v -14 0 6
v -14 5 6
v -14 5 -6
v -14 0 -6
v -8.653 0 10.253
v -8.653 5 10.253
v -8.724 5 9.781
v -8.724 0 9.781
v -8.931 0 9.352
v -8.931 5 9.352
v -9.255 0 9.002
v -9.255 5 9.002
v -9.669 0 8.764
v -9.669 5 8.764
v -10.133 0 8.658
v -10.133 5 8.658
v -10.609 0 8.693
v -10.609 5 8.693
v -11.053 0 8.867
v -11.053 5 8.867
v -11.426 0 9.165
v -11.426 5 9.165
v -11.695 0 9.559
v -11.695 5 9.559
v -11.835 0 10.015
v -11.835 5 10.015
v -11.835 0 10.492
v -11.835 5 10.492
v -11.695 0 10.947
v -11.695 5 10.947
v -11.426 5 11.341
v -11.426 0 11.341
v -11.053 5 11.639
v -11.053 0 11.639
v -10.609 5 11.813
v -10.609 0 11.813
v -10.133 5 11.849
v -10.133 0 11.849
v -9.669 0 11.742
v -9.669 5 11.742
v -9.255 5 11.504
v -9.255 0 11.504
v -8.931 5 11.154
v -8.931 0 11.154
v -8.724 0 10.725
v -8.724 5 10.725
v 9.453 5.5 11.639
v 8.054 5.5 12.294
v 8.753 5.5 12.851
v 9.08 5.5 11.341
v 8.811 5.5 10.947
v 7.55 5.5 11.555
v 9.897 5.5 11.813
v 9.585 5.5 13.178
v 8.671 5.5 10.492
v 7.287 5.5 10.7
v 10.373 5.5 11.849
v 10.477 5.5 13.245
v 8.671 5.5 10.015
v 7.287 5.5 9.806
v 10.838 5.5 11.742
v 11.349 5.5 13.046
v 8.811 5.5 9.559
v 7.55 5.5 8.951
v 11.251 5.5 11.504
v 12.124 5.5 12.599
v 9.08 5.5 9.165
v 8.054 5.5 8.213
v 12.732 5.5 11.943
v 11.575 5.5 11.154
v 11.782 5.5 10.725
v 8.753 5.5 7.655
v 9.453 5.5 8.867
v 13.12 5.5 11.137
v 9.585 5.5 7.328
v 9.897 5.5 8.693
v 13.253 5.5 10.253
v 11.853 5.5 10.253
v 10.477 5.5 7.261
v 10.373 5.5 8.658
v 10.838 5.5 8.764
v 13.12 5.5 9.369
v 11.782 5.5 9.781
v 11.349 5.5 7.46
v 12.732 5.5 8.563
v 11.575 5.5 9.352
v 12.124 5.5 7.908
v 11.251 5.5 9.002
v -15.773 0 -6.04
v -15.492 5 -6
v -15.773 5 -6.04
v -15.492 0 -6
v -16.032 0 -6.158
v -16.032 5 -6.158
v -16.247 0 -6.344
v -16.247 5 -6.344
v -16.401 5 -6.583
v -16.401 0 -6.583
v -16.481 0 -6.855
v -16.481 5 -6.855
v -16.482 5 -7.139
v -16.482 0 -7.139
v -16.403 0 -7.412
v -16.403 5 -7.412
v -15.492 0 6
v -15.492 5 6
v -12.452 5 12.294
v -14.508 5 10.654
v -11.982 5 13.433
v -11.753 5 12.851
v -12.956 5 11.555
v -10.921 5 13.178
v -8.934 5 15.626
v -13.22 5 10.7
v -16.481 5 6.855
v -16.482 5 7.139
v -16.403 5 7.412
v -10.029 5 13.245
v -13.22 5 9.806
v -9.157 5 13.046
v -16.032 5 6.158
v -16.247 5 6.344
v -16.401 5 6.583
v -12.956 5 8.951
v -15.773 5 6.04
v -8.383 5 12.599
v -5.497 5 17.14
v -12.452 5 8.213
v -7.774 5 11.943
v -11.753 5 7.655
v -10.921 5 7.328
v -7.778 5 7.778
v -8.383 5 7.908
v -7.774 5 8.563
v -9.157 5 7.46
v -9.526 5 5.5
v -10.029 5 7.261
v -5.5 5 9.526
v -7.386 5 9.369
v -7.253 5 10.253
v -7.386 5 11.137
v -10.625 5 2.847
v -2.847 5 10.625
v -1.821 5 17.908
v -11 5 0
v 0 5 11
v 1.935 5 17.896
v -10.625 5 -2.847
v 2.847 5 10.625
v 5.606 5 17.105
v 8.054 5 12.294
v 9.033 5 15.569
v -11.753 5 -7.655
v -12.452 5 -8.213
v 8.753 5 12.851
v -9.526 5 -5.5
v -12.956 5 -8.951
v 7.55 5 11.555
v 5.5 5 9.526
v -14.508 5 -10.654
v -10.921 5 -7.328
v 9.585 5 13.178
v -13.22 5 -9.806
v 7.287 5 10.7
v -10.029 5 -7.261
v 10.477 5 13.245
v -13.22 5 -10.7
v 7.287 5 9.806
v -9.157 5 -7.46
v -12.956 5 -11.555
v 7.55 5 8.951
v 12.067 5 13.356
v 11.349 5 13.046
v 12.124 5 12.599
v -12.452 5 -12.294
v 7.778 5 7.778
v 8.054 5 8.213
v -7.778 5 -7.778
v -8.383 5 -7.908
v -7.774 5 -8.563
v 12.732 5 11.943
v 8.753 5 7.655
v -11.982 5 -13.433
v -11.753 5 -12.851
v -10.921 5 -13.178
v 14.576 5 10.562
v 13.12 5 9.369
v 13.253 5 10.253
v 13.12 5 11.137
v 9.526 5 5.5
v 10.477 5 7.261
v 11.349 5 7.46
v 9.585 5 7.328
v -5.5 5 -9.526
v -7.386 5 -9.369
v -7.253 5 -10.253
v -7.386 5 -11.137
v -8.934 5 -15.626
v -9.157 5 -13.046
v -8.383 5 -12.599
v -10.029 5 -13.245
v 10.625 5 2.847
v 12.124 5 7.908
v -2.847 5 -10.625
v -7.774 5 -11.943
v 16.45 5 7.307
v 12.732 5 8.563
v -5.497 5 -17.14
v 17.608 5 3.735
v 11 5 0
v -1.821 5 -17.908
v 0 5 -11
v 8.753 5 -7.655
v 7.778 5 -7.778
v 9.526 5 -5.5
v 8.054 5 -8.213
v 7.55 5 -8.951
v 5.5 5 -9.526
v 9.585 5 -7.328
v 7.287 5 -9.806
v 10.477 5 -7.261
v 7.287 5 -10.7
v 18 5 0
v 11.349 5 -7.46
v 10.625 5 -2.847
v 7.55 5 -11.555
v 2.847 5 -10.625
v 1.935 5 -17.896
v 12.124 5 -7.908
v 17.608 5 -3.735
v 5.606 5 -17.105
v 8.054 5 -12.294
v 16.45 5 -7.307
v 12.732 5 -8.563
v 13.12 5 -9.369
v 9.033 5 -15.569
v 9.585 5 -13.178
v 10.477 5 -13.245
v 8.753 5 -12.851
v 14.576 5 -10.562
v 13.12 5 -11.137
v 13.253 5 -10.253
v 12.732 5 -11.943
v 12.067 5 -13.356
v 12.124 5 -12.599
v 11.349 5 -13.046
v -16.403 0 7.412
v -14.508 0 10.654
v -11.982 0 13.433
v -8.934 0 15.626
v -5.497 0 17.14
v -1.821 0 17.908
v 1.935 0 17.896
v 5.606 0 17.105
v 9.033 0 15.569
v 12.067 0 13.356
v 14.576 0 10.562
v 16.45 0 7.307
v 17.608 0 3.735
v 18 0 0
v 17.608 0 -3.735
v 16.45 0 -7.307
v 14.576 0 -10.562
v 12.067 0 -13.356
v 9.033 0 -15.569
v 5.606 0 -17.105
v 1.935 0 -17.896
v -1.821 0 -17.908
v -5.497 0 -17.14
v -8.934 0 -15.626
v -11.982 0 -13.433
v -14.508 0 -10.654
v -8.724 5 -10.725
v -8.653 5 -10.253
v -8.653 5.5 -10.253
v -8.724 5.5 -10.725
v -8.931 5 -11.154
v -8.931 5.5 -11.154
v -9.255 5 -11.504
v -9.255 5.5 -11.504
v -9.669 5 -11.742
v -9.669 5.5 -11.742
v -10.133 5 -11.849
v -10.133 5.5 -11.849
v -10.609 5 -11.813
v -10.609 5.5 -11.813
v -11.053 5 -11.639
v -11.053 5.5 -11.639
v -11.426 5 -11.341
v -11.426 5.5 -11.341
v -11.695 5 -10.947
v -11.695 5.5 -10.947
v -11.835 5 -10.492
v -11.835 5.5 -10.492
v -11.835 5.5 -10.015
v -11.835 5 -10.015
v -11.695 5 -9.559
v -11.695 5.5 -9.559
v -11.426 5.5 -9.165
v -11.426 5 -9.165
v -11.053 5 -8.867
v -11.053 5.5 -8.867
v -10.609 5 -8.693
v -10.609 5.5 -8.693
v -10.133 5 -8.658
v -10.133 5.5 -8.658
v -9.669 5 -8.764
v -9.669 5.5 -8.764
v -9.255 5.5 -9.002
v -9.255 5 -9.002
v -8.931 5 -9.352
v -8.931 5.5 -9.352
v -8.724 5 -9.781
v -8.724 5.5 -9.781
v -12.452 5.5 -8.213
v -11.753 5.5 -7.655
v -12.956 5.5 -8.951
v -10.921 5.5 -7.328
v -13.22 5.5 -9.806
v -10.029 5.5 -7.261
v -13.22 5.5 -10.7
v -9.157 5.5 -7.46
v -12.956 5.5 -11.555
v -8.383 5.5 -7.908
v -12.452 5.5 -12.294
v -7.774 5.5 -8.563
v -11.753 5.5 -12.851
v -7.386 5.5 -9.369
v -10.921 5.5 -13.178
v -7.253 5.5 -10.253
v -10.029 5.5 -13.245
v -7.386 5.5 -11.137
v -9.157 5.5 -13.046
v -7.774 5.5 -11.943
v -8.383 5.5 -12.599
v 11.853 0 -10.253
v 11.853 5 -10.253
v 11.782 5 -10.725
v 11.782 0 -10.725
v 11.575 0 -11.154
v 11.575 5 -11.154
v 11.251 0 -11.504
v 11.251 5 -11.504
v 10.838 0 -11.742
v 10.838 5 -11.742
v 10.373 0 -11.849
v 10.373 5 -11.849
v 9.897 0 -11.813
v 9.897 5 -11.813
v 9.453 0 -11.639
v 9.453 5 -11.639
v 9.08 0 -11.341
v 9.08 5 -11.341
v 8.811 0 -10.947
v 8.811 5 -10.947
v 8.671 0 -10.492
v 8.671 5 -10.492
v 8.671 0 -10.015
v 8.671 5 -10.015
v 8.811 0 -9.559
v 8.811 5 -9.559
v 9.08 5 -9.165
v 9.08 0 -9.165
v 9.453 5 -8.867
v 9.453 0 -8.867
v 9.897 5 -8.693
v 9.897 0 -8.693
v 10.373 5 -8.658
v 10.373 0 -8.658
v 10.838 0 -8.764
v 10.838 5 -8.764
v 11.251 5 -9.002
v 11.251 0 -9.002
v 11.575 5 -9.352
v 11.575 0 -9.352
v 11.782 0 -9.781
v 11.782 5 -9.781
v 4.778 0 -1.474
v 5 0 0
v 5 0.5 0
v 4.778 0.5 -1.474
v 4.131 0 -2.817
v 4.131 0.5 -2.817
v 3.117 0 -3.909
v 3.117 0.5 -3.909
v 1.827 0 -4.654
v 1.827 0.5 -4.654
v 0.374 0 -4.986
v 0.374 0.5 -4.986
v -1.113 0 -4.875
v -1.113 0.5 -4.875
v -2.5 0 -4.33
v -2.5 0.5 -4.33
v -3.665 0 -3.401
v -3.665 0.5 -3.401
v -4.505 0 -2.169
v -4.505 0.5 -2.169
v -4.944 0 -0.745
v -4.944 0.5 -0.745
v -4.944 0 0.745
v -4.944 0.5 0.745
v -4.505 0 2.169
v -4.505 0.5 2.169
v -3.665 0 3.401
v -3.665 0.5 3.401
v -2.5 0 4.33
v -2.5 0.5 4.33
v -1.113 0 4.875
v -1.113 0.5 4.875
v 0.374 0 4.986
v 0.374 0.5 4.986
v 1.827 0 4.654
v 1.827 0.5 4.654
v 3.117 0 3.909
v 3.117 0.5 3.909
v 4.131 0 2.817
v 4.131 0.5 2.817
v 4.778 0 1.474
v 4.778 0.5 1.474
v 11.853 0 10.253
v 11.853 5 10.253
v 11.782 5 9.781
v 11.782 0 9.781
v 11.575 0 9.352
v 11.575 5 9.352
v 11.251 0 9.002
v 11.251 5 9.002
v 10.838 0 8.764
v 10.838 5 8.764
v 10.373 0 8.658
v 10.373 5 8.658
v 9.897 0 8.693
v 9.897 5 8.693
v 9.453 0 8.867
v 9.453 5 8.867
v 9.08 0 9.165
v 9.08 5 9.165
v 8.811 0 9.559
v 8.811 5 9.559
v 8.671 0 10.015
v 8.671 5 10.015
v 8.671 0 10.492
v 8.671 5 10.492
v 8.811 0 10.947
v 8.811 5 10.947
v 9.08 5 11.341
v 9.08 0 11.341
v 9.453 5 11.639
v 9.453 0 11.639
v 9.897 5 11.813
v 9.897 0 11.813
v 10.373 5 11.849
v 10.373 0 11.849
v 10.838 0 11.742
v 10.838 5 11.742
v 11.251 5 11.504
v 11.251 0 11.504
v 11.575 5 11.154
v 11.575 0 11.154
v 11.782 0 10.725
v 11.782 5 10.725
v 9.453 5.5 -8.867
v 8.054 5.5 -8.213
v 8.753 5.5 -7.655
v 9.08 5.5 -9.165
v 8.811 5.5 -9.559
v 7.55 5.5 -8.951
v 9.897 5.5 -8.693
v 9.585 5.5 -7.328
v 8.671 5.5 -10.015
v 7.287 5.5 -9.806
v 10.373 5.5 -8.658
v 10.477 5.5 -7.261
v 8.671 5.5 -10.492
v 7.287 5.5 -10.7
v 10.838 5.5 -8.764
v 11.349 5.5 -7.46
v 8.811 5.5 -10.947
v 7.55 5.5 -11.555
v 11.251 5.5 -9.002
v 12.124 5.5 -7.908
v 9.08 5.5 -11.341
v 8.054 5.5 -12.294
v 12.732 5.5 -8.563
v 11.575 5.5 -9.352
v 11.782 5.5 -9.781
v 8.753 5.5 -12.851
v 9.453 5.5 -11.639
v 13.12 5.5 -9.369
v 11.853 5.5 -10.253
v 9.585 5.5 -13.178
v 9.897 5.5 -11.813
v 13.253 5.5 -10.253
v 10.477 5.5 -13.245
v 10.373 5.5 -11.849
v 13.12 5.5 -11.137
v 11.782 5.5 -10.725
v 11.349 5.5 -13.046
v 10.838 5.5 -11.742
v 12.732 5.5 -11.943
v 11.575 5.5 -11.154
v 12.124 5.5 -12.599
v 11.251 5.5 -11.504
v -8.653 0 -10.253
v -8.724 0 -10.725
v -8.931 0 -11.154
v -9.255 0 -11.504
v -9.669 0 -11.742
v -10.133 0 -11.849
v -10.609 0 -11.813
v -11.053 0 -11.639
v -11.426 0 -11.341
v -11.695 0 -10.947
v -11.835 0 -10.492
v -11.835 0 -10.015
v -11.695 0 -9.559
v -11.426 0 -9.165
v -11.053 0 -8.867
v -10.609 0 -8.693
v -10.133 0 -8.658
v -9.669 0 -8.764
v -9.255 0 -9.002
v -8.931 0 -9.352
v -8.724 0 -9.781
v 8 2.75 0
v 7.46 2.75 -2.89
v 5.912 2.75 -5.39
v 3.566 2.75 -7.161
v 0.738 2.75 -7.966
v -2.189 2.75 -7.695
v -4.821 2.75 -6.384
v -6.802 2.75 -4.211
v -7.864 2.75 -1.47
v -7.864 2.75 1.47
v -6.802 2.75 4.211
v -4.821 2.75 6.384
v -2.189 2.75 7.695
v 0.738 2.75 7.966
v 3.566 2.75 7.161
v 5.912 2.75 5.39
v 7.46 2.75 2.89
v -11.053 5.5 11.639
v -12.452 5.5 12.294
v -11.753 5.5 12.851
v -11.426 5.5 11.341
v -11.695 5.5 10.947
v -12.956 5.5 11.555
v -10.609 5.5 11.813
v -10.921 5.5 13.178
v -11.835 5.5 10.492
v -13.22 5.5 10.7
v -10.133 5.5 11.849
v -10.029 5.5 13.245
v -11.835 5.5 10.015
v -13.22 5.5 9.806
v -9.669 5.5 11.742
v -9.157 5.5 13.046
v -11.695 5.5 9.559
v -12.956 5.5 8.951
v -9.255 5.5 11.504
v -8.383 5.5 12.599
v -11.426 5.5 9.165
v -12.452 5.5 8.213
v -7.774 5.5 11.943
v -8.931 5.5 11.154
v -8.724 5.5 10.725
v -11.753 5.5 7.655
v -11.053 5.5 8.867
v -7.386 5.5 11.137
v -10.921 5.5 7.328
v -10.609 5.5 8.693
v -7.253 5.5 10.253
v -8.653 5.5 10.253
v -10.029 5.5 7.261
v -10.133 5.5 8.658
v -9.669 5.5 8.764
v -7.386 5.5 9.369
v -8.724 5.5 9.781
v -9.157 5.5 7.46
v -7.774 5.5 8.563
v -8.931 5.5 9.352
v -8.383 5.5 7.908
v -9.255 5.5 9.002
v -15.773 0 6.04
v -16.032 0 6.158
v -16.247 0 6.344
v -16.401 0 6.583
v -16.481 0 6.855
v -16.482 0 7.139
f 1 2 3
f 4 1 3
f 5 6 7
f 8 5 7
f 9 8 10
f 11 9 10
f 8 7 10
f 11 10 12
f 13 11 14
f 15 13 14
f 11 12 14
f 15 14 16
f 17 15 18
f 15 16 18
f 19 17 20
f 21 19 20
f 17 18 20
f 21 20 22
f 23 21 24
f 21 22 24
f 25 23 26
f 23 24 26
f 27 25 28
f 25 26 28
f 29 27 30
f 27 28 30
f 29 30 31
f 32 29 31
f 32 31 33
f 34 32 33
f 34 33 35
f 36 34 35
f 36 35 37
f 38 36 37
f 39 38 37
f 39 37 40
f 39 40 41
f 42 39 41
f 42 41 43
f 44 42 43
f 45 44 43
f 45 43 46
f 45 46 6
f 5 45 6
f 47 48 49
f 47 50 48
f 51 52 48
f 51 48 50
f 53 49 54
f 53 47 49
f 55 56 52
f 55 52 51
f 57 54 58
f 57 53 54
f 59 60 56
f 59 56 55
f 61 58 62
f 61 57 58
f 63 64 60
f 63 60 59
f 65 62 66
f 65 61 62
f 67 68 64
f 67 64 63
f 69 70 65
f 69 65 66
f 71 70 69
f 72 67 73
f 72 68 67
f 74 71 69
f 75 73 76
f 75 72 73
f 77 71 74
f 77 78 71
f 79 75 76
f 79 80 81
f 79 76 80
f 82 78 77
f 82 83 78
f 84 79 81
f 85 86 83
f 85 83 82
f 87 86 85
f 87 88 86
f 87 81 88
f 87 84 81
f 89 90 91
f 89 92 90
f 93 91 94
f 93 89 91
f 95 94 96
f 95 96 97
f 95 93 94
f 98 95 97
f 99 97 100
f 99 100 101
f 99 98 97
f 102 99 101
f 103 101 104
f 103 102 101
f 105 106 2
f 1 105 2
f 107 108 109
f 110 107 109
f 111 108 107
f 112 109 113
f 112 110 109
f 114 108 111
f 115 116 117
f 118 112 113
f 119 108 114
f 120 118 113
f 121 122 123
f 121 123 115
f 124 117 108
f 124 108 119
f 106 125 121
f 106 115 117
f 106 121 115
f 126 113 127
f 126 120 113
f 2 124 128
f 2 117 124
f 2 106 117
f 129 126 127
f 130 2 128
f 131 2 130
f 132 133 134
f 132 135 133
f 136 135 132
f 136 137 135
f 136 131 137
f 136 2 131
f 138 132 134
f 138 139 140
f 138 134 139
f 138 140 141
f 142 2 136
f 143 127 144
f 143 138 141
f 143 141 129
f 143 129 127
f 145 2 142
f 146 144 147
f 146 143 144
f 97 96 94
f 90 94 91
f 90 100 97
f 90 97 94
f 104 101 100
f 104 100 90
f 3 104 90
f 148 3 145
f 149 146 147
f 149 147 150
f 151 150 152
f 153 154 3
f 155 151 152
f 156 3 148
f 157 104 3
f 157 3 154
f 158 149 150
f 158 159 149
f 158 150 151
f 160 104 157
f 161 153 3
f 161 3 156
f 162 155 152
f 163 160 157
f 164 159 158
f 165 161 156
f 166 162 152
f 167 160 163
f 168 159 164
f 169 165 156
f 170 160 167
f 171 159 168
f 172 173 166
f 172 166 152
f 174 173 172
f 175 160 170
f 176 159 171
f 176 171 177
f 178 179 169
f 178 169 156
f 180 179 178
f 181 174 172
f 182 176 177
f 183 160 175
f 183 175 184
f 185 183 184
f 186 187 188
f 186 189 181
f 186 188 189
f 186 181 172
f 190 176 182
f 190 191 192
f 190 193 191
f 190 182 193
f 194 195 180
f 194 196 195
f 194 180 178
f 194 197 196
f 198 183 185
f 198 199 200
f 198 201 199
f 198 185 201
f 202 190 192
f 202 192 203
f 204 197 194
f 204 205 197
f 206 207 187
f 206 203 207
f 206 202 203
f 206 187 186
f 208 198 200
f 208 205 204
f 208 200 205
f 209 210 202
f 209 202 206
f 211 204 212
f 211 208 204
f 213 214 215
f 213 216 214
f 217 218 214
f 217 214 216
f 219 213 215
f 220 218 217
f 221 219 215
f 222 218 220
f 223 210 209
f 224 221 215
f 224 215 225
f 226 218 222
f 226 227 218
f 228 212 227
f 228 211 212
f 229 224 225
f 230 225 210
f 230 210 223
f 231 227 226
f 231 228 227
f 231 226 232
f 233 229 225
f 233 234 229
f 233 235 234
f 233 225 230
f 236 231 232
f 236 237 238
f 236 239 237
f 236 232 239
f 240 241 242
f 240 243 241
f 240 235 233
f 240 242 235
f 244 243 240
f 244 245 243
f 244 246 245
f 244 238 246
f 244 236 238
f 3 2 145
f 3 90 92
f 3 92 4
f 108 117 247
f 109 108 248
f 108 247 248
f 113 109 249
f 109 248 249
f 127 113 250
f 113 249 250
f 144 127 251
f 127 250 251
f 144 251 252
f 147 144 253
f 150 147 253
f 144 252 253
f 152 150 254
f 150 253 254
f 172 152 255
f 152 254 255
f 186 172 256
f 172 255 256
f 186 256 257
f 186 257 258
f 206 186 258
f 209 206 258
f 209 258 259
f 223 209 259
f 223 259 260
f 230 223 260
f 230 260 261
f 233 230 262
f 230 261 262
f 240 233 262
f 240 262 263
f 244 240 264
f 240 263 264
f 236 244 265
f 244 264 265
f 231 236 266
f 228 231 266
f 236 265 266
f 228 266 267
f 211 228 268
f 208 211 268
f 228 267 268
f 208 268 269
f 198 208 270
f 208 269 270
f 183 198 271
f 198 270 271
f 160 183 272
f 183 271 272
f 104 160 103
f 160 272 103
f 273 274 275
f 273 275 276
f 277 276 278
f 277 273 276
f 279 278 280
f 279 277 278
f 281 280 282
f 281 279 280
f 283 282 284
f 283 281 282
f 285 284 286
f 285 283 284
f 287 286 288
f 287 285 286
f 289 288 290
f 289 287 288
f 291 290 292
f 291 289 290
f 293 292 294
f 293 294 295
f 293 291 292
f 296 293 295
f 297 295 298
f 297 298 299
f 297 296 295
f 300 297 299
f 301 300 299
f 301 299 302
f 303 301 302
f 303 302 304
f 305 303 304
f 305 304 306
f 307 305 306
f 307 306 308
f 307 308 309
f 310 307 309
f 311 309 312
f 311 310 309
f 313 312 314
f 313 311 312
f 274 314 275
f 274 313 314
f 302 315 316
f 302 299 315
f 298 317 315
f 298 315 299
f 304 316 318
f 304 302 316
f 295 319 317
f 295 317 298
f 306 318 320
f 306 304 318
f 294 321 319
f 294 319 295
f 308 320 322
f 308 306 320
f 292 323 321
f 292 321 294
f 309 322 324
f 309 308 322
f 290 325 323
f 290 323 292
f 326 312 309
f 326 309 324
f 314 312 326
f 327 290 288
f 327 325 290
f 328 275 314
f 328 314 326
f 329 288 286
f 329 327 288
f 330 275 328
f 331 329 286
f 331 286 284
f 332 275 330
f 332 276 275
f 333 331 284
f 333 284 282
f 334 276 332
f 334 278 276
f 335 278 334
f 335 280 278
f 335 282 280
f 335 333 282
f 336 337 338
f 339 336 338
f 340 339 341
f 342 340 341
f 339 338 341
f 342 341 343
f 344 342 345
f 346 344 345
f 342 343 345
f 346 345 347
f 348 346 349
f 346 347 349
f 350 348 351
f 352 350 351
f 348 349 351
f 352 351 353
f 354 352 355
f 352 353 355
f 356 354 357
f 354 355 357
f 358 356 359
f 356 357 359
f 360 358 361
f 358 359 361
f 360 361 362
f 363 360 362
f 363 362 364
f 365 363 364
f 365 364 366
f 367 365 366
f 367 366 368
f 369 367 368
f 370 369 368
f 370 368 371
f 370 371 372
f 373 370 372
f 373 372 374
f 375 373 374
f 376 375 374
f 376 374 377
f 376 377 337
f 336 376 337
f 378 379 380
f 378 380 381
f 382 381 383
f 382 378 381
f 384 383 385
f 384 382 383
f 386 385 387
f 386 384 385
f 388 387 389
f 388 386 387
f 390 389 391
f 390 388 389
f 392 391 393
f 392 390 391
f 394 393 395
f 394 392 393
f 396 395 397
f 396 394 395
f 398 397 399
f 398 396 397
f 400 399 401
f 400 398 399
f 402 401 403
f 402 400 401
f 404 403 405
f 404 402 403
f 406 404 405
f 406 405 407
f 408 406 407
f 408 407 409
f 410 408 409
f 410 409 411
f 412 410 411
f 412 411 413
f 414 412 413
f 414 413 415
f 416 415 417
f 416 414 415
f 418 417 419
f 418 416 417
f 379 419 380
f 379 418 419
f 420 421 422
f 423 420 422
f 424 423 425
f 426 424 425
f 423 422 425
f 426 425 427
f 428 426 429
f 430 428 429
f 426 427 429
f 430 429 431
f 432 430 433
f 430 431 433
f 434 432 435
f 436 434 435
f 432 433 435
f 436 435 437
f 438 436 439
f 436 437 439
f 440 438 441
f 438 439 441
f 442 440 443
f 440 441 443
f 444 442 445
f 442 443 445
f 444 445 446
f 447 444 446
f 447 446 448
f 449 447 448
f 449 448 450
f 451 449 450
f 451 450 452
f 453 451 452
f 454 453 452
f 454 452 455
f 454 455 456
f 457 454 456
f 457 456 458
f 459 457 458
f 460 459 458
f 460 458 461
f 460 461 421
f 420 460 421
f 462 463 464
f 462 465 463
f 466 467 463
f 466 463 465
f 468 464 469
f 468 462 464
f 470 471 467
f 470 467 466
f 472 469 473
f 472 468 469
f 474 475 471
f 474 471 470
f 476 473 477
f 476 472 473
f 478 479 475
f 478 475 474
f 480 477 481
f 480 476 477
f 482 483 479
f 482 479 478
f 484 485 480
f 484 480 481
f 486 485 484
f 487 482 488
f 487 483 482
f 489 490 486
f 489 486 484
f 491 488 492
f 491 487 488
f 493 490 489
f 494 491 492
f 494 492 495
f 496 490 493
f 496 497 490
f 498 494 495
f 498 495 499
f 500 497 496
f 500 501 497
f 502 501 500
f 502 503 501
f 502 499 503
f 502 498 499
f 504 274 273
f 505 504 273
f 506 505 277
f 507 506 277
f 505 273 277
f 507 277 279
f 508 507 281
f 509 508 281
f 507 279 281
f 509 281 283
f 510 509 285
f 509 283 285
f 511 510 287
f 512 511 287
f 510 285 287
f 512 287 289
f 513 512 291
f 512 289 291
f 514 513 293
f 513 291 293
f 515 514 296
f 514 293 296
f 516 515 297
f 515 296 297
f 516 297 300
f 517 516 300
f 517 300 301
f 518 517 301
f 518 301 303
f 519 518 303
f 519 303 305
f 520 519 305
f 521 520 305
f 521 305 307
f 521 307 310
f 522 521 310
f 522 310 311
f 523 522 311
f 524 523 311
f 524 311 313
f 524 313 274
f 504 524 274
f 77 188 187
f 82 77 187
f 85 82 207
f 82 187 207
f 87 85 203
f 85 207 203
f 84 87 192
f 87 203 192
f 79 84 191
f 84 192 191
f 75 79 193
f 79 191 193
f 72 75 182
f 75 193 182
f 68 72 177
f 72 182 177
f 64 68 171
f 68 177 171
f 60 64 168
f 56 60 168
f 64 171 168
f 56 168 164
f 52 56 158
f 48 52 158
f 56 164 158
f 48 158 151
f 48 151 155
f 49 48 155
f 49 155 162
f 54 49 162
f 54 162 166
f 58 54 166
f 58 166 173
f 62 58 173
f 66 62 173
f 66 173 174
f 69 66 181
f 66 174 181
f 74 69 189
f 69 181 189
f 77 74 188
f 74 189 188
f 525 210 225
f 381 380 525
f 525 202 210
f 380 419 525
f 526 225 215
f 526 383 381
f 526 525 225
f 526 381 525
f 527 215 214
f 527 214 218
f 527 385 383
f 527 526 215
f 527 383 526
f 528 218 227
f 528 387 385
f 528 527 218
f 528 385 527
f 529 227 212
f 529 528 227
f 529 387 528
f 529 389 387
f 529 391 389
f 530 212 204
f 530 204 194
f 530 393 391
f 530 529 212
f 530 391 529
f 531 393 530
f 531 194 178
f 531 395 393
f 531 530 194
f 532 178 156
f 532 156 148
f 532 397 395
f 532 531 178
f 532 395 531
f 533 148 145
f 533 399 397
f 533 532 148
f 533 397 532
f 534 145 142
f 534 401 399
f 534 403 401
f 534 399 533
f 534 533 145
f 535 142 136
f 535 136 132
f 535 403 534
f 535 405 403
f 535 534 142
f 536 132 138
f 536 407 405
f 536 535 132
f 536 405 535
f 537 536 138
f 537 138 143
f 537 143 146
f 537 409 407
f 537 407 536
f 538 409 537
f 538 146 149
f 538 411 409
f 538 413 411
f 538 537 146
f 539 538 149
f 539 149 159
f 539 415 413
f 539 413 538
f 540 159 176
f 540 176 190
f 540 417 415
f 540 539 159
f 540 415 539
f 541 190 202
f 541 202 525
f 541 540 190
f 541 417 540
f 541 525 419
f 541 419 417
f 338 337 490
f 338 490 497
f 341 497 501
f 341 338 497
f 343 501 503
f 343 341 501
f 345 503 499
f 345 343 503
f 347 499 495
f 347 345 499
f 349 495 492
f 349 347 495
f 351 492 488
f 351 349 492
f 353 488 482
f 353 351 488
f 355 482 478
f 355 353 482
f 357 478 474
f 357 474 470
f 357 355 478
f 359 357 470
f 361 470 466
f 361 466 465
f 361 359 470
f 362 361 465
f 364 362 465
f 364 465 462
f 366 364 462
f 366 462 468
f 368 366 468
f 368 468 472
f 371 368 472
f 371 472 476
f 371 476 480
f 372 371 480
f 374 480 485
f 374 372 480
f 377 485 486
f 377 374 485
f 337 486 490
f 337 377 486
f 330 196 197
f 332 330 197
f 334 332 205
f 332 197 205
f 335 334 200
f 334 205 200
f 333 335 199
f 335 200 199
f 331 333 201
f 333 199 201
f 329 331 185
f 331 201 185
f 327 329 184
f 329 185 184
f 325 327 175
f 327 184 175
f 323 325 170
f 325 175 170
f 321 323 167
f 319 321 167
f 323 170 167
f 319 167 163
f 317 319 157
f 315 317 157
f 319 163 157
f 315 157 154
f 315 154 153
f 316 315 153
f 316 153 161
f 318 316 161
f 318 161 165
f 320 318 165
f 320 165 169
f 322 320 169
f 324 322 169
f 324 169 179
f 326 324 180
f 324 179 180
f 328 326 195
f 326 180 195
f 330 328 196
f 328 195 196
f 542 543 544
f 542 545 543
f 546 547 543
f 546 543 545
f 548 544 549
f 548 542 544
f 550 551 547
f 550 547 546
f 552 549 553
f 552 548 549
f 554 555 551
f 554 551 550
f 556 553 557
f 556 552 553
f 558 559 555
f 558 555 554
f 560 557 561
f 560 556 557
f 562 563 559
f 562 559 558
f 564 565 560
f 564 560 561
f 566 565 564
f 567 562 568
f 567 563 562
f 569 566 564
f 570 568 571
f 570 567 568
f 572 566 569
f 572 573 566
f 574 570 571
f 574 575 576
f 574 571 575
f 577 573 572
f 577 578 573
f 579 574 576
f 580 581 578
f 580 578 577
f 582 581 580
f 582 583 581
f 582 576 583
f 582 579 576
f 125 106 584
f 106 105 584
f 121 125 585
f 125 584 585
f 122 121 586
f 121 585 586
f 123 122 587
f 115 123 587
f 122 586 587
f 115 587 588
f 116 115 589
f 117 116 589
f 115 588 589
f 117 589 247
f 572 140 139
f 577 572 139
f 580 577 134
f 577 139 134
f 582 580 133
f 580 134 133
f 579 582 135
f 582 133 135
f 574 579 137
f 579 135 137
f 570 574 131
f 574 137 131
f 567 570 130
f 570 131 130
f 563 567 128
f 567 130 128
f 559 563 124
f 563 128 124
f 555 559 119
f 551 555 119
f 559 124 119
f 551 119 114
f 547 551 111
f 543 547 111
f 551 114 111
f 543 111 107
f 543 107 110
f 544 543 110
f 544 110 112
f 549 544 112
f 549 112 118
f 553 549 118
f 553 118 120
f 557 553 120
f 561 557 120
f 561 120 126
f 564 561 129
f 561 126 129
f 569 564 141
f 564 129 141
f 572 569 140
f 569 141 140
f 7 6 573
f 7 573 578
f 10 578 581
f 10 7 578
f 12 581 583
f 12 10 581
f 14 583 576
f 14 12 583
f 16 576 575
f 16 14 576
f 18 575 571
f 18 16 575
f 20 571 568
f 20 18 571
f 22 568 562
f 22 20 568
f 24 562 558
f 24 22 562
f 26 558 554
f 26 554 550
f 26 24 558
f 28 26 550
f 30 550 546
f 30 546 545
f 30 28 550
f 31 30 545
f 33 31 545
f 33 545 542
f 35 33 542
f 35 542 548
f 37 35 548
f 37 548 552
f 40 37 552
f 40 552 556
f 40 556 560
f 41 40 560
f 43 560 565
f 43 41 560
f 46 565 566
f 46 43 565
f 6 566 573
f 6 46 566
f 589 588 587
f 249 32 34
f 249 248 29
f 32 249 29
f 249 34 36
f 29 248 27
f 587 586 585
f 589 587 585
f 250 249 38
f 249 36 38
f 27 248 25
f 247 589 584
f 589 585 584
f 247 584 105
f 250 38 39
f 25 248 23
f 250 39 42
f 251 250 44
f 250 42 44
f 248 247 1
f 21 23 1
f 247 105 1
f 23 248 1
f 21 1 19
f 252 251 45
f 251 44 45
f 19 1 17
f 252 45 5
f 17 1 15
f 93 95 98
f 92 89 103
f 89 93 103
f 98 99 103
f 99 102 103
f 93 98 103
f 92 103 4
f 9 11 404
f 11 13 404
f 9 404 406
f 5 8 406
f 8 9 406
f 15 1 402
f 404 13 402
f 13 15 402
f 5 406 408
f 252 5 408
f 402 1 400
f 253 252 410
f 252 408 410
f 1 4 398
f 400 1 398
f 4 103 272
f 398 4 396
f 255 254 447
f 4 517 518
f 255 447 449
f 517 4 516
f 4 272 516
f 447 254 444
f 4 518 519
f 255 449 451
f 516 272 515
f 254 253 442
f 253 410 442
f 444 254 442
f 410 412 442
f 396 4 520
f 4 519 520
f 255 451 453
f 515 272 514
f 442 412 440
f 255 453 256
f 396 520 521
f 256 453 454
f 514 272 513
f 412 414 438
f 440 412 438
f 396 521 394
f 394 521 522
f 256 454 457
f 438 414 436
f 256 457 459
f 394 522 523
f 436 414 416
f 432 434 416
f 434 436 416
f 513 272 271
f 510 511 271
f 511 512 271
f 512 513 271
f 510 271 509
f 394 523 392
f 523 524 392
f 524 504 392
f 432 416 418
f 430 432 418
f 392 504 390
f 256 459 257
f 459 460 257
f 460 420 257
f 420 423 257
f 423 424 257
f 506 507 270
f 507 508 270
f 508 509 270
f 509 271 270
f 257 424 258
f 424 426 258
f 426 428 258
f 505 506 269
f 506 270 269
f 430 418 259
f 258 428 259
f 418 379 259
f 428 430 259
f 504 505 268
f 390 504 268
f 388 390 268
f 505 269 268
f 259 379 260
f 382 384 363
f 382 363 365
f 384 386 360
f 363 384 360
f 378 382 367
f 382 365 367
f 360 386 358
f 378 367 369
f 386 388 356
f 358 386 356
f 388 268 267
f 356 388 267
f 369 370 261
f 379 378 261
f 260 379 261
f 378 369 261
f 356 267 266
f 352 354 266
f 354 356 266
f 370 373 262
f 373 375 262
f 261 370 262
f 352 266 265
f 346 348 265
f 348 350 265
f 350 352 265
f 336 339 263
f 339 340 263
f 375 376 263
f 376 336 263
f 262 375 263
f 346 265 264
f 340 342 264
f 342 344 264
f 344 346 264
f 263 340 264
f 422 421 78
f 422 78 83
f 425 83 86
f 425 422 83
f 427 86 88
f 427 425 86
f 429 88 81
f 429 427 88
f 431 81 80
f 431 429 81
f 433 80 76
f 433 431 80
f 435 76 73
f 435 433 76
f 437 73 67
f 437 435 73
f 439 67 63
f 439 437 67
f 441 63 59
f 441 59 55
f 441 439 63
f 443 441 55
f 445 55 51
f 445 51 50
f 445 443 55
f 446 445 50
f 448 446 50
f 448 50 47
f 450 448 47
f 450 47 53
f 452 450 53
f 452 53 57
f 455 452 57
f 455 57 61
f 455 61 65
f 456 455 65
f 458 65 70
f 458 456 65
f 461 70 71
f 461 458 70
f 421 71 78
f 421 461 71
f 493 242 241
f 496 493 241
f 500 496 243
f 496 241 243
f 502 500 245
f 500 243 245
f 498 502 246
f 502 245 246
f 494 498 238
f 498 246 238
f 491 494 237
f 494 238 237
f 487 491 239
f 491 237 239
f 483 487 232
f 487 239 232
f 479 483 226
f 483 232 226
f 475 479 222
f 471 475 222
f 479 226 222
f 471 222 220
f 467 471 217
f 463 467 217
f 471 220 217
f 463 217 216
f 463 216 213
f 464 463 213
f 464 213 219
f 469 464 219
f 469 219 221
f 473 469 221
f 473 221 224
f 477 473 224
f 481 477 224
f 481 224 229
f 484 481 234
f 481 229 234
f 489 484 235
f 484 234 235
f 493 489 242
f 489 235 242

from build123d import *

# Parameters (mm, degrees)
SKETCH1_R            = 18
SKETCH1_R_2          = 5
BODY_DEPTH           = 5
OBJECTIVE_RING_SIZE  = 6
OBJECTIVE_RING_SIZE2 = 4.5
BOLTS_DEPTH          = 10
BOLTS_DEPTH_BACK     = 10
SKETCH6_R            = 1.6
WASH_START           = 0.5
SKETCH8_R            = 3
SKETCH8_R_2          = 1.6
WASH_DEPTH           = 0.5
SPE_DEPTH            = 10
SPE_DEPTH_BACK       = 9.5
SKETCH9_W            = 8
SKETCH9_H            = 12
SPE_FILLET_R         = 1


with BuildPart() as part:
    # Sketch1 → Body (new body)
    with BuildSketch(Plane(origin=(0, 0, 0), x_dir=(1, 0, 0), z_dir=(0, 1, 0))):
        Circle(SKETCH1_R)
        Circle(SKETCH1_R_2, mode=Mode.SUBTRACT)
    extrude(amount=BODY_DEPTH)

    # Objective_ring
    objective_ring_edges = [part.edges().sort_by_distance(p)[0] for p in [
        (-5, 5, 0),
    ]]
    objective_ring_side = [part.faces().sort_by_distance(p)[0] for p in [
        (-17.490883118, 5, 0),
    ]]
    chamfer(objective_ring_edges, length=OBJECTIVE_RING_SIZE, length2=OBJECTIVE_RING_SIZE2, reference=objective_ring_side[0])

    # Sketch6 → Bolts (cut, two sides: drawn at the far end of the back side and taken through both)
    with BuildSketch(Plane(origin=(0, 5, 0), x_dir=(1, 0, 0), z_dir=(0, 1, 0)).offset(-BOLTS_DEPTH_BACK)):
        with Locations((-10.253048327, 10.253048327)):
            Circle(SKETCH6_R)
        with Locations((-10.253048327, -10.253048327)):
            Circle(SKETCH6_R)
        with Locations((10.253048327, -10.253048327)):
            Circle(SKETCH6_R)
        with Locations((10.253048327, 10.253048327)):
            Circle(SKETCH6_R)
    extrude(amount=BOLTS_DEPTH + BOLTS_DEPTH_BACK, mode=Mode.SUBTRACT)

    # Sketch8 → Wash (add)
    # profile 1 of 4: a face of its own
    with BuildSketch(Plane(origin=(0, 5, 0), x_dir=(1, 0, 0), z_dir=(0, 1, 0)).offset(WASH_START)):
        with Locations((-10.253048327, 10.253048327)):
            Circle(SKETCH8_R)
        with Locations((-10.253048327, 10.253048327)):
            Circle(SKETCH8_R_2, mode=Mode.SUBTRACT)
    # profile 2 of 4: a face of its own
    with BuildSketch(Plane(origin=(0, 5, 0), x_dir=(1, 0, 0), z_dir=(0, 1, 0)).offset(WASH_START)):
        with Locations((10.253048327, 10.253048327)):
            Circle(SKETCH8_R)
        with Locations((10.253048327, 10.253048327)):
            Circle(SKETCH8_R_2, mode=Mode.SUBTRACT)
    # profile 3 of 4: a face of its own
    with BuildSketch(Plane(origin=(0, 5, 0), x_dir=(1, 0, 0), z_dir=(0, 1, 0)).offset(WASH_START)):
        with Locations((10.253048327, -10.253048327)):
            Circle(SKETCH8_R)
        with Locations((10.253048327, -10.253048327)):
            Circle(SKETCH8_R_2, mode=Mode.SUBTRACT)
    # profile 4 of 4: a face of its own
    with BuildSketch(Plane(origin=(0, 5, 0), x_dir=(1, 0, 0), z_dir=(0, 1, 0)).offset(WASH_START)):
        with Locations((-10.253048327, -10.253048327)):
            Circle(SKETCH8_R)
        with Locations((-10.253048327, -10.253048327)):
            Circle(SKETCH8_R_2, mode=Mode.SUBTRACT)
    extrude(amount=-WASH_DEPTH)

    # Sketch9 → SPE (cut, two sides: drawn at the far end of the back side and taken through both)
    with BuildSketch(Plane(origin=(0, 5, 0), x_dir=(1, 0, 0), z_dir=(0, 1, 0)).offset(-SPE_DEPTH_BACK)):
        with Locations((-18, 0)):
            Rectangle(SKETCH9_W, SKETCH9_H)
    extrude(amount=SPE_DEPTH + SPE_DEPTH_BACK, mode=Mode.SUBTRACT)

    # SPE_Fillet
    spe_fillet_edges = [part.edges().sort_by_distance(p)[0] for p in [
        (-16.970562748, 2.5, 6),
        (-16.970562748, 2.5, -6),
    ]]
    fillet(spe_fillet_edges, radius=SPE_FILLET_R)


solid = part.part
